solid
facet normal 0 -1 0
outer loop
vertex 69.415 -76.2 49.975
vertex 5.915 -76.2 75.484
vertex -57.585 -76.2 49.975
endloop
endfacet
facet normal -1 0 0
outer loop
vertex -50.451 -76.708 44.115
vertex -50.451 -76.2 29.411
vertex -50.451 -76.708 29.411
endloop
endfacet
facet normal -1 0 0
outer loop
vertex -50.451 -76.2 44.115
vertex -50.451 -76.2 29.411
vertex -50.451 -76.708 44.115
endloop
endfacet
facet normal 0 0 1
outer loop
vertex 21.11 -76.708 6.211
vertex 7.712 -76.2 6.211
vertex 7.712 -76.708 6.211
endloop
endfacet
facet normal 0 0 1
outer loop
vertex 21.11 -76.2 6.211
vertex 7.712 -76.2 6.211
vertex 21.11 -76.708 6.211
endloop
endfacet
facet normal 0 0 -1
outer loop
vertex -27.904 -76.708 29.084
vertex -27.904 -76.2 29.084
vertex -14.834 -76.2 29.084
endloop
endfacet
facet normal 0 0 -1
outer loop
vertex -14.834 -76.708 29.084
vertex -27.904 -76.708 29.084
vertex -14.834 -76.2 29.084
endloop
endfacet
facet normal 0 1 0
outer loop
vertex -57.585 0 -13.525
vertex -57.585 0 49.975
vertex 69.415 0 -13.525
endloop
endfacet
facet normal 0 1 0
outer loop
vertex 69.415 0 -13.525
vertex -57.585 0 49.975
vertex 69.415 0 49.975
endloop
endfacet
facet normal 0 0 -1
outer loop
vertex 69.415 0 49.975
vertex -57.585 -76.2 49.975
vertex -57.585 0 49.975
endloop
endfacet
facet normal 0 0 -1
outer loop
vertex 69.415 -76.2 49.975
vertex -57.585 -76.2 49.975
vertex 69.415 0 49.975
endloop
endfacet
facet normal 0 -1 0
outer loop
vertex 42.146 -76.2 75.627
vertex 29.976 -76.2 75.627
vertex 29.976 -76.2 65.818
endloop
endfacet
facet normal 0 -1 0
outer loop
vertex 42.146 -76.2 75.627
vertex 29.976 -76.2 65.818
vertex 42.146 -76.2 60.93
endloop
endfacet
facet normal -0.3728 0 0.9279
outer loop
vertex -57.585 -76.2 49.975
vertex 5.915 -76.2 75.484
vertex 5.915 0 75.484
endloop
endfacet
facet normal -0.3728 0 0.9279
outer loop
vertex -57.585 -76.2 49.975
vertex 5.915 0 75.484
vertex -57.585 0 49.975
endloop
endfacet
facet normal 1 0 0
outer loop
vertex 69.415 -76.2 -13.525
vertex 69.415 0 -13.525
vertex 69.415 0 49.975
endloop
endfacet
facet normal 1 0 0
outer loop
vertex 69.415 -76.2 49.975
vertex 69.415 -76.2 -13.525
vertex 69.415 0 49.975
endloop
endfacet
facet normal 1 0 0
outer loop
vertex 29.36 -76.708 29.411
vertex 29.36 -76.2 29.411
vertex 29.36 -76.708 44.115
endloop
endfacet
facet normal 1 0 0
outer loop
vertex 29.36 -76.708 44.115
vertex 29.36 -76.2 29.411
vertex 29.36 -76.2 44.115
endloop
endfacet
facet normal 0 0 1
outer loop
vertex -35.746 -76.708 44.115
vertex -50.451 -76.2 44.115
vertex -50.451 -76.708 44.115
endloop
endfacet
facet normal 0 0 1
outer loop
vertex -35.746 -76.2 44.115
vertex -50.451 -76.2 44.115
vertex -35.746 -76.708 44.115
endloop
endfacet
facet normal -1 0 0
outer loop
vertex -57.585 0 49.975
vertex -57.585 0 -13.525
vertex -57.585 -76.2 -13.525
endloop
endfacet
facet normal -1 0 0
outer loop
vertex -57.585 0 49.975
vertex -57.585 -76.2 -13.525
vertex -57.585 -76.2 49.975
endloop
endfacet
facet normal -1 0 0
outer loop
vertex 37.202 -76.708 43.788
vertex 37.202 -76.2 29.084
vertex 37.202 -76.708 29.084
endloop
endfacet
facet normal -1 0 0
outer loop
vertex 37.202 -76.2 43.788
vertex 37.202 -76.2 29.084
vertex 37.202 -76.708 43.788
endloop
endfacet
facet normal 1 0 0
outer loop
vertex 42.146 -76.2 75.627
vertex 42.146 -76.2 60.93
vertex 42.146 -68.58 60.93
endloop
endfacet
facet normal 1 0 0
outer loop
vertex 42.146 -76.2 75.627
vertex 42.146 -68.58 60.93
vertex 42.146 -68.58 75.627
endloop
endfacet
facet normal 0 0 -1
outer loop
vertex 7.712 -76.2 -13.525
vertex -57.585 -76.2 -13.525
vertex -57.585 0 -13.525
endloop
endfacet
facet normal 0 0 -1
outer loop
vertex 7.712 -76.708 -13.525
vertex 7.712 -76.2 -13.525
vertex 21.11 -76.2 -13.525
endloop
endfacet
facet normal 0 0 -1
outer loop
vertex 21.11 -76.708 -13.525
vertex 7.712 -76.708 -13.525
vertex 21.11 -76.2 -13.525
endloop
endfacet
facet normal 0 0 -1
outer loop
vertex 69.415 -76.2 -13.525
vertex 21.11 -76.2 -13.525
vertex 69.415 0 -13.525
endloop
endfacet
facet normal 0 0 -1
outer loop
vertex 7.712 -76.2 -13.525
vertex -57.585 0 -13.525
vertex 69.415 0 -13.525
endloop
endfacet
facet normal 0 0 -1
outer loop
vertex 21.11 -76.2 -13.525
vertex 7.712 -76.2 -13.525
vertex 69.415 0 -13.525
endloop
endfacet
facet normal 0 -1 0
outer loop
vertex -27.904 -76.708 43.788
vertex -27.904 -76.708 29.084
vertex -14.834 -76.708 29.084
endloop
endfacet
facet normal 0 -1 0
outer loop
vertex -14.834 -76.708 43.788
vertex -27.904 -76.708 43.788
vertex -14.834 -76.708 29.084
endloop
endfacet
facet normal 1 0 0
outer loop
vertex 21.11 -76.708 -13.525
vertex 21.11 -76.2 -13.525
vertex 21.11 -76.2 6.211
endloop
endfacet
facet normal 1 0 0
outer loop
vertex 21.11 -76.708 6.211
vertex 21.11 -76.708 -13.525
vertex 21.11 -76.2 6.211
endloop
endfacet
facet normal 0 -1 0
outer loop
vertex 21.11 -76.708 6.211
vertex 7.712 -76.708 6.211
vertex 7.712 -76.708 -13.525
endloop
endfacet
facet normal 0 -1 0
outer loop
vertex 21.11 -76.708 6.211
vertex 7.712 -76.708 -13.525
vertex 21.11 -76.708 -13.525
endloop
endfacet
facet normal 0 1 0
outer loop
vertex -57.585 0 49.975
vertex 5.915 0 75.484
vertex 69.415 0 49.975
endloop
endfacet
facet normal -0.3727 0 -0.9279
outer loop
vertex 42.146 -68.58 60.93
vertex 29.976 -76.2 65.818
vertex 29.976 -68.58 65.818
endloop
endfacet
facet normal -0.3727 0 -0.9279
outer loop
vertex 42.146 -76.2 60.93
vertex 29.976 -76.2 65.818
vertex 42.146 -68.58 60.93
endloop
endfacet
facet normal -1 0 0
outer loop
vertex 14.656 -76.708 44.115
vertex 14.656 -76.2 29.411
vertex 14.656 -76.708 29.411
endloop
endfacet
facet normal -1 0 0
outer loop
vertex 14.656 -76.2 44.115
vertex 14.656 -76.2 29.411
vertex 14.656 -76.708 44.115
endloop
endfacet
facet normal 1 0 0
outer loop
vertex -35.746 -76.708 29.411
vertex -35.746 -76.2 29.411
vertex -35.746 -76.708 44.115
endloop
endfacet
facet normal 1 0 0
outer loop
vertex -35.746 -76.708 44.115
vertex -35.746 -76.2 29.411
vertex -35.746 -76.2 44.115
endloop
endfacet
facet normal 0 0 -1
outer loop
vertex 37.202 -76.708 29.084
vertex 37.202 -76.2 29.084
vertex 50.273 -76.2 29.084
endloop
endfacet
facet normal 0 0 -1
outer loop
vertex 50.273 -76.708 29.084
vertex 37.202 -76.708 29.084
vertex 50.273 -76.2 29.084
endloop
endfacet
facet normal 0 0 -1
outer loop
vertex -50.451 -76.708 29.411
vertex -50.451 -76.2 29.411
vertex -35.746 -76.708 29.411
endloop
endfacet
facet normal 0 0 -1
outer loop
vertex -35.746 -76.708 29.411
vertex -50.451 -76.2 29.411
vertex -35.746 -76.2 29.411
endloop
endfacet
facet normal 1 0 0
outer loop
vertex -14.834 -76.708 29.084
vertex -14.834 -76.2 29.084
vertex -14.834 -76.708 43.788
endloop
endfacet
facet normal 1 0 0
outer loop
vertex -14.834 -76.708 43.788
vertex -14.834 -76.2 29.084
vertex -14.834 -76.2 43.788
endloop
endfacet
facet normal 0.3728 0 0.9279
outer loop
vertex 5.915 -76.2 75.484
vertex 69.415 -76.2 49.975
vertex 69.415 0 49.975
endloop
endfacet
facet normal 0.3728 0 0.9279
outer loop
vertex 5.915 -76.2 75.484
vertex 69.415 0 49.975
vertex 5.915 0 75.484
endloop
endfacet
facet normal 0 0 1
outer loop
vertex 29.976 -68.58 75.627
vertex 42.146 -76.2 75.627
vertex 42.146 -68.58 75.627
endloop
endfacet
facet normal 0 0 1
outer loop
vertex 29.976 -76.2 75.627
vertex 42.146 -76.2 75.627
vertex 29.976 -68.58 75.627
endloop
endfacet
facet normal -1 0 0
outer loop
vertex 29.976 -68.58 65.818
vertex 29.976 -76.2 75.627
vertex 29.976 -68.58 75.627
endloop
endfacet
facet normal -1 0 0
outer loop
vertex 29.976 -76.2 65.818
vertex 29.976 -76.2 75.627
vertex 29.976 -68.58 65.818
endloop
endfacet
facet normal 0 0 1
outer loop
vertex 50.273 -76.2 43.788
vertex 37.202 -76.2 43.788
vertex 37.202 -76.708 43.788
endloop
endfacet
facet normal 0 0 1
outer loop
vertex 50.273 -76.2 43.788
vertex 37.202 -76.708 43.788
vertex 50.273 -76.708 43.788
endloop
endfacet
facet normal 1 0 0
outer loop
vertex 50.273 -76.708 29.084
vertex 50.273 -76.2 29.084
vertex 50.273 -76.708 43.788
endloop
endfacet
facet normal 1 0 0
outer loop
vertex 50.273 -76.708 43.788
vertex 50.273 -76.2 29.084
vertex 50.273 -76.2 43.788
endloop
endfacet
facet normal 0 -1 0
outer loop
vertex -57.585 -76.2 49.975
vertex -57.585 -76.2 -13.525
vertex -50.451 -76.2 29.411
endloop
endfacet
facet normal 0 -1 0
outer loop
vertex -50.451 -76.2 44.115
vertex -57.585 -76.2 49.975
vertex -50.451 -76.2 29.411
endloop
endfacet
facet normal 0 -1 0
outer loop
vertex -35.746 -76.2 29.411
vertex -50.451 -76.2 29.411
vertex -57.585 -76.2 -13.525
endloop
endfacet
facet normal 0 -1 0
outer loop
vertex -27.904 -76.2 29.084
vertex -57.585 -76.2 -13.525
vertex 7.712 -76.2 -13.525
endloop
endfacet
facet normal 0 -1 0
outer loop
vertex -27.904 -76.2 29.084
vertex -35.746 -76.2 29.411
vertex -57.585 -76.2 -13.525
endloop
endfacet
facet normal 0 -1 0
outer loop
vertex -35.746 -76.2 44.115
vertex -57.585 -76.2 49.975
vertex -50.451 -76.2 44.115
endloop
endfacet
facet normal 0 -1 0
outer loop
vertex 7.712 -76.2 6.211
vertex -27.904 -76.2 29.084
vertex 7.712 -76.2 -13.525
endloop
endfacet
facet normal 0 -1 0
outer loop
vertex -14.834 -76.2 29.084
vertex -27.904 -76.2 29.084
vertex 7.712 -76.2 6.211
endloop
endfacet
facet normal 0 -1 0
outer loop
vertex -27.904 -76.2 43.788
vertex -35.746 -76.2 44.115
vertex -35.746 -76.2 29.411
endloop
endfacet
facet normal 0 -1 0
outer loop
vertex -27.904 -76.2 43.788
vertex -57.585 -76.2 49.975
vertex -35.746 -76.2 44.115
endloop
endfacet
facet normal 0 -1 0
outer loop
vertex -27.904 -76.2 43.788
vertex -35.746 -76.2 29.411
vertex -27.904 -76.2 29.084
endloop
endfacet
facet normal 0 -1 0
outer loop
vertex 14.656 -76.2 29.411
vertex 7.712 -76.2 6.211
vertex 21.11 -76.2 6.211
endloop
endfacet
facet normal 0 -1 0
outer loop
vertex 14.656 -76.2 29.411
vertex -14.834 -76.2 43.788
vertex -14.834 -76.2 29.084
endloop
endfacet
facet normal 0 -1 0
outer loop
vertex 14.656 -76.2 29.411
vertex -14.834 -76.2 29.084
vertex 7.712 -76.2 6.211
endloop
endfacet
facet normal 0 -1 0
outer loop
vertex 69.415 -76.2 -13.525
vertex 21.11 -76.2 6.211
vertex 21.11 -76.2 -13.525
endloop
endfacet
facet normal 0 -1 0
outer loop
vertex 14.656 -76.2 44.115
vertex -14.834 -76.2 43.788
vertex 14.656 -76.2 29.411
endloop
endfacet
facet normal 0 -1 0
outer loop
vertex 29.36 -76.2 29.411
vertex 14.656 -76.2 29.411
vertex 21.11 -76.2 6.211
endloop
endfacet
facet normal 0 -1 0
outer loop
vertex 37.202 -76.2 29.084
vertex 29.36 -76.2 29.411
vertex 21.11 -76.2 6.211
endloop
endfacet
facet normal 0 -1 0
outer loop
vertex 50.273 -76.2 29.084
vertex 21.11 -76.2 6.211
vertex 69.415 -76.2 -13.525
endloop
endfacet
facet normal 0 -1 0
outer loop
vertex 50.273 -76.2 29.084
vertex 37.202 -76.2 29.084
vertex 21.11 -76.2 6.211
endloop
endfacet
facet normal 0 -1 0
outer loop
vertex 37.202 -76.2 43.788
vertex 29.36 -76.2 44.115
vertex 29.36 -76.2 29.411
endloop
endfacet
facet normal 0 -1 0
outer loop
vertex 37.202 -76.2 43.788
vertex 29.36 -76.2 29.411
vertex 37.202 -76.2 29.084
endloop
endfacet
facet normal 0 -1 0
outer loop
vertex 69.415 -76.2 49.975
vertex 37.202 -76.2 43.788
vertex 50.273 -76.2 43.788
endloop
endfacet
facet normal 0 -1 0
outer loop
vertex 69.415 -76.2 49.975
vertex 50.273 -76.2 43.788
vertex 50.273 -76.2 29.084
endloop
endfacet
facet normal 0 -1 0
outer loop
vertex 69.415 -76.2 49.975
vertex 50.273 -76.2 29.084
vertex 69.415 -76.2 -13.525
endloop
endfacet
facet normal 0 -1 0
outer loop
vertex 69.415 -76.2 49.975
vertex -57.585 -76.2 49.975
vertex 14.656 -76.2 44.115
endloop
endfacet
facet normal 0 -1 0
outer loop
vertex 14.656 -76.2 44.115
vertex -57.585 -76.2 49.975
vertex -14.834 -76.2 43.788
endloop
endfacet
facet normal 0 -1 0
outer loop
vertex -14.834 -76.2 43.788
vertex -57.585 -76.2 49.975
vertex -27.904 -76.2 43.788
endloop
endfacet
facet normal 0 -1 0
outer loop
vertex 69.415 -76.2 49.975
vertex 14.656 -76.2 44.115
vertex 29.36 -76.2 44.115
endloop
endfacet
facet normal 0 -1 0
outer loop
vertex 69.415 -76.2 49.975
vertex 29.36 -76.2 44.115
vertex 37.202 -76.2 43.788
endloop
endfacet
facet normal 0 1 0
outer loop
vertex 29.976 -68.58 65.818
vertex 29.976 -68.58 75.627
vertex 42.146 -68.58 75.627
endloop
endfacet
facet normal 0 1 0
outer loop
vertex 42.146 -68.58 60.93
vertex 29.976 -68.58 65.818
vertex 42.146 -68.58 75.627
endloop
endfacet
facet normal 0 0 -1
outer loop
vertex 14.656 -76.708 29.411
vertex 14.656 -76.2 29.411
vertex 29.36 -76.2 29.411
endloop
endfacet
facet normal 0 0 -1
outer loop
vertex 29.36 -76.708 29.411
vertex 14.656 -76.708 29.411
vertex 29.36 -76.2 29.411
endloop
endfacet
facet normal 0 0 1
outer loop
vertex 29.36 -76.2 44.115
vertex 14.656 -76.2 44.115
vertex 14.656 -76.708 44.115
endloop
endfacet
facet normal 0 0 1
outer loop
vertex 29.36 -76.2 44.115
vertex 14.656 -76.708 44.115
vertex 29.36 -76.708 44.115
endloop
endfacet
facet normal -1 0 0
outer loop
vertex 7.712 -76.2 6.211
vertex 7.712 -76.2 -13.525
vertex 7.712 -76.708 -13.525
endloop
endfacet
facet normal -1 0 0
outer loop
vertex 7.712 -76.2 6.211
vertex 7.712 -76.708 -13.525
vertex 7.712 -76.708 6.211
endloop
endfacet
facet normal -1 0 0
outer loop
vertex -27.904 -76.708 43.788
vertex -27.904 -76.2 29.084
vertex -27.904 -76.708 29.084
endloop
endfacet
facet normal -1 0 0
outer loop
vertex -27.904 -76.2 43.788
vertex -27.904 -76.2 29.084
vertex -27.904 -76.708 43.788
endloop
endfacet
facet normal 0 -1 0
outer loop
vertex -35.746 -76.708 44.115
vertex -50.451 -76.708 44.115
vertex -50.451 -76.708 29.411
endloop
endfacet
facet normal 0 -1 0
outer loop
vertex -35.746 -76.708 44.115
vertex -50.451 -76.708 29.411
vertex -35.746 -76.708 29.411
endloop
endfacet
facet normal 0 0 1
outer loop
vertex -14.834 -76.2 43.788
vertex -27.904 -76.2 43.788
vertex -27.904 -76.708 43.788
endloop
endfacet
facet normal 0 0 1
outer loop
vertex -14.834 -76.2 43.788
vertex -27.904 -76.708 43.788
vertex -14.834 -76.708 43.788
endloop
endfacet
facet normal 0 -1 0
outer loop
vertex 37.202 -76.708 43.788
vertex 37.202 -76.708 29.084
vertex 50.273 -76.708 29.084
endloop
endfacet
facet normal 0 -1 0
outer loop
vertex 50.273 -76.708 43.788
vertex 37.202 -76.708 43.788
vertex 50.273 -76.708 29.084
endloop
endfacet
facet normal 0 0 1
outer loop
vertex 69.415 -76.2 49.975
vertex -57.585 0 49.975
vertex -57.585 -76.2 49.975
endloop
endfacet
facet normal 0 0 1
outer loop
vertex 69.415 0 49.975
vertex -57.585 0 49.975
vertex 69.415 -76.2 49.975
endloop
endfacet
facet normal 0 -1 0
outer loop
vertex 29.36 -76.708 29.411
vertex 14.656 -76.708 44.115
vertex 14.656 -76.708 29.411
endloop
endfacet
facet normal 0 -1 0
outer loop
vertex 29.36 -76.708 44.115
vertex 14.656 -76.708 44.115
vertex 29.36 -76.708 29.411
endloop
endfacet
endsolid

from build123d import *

# Parameters (mm, degrees)
F0_W     = 127
F0_H     = 63.5
F1_DEPTH = 76.2
F2_W     = 13.3971069008
F2_H     = 19.7356194196
F2_W_2   = 14.7041380405
F2_H_2   = 14.7041361779
F2_W_3   = 13.0703430623
F2_H_3   = 14.7041380405
F3_DEPTH = 0.508
F5_DEPTH = 76.2
F7_DEPTH = 7.62


with BuildPart() as f1:
    # F0 (on Front) → F1 (new body)
    with BuildSketch(Plane.XZ):
        with Locations((5.9152878821, 18.2254010985)):
            Rectangle(F0_W, F0_H)
    extrude(amount=F1_DEPTH)

    # F2 (on face) → F3 (join)
    with BuildSketch(Plane.XZ.offset(76.2)):
        with Locations((14.4110089168, -3.6567891917)):
            Rectangle(F2_W, F2_H)
        with Locations((-43.0985055864, 36.7629500106)):
            Rectangle(F2_W_2, F2_H_2)
        with Locations((-21.3690595701, 36.4361926913)):
            Rectangle(F2_W_3, F2_H_3)
        with Locations((22.0081503503, 36.7629500106)):
            Rectangle(F2_W_2, F2_H_2)
        with Locations((43.7375963666, 36.4361926913)):
            Rectangle(F2_W_3, F2_H_3)
    extrude(amount=F3_DEPTH)


with BuildPart() as f5:
    # F4 (on face) → F5 (new body)
    with BuildSketch(Plane.XZ.offset(76.2)):
        Polygon((69.4152878821, 49.9754010985), (5.9152878821, 75.4838436842), (-57.5847121179, 49.9754010985), align=None)
    extrude(amount=-F5_DEPTH)


with BuildPart() as f7:
    # F6 (on face) → F7 (new body)
    with BuildSketch(Plane.XZ.offset(76.2)):
        Polygon((29.9764143668, 75.6273716688), (29.9764143668, 65.818302527), (42.1461313963, 60.9296327927), (42.1461313963, 75.6273716688), align=None)
    extrude(amount=-F7_DEPTH)


solid = Compound([f1.part, f5.part, f7.part])
